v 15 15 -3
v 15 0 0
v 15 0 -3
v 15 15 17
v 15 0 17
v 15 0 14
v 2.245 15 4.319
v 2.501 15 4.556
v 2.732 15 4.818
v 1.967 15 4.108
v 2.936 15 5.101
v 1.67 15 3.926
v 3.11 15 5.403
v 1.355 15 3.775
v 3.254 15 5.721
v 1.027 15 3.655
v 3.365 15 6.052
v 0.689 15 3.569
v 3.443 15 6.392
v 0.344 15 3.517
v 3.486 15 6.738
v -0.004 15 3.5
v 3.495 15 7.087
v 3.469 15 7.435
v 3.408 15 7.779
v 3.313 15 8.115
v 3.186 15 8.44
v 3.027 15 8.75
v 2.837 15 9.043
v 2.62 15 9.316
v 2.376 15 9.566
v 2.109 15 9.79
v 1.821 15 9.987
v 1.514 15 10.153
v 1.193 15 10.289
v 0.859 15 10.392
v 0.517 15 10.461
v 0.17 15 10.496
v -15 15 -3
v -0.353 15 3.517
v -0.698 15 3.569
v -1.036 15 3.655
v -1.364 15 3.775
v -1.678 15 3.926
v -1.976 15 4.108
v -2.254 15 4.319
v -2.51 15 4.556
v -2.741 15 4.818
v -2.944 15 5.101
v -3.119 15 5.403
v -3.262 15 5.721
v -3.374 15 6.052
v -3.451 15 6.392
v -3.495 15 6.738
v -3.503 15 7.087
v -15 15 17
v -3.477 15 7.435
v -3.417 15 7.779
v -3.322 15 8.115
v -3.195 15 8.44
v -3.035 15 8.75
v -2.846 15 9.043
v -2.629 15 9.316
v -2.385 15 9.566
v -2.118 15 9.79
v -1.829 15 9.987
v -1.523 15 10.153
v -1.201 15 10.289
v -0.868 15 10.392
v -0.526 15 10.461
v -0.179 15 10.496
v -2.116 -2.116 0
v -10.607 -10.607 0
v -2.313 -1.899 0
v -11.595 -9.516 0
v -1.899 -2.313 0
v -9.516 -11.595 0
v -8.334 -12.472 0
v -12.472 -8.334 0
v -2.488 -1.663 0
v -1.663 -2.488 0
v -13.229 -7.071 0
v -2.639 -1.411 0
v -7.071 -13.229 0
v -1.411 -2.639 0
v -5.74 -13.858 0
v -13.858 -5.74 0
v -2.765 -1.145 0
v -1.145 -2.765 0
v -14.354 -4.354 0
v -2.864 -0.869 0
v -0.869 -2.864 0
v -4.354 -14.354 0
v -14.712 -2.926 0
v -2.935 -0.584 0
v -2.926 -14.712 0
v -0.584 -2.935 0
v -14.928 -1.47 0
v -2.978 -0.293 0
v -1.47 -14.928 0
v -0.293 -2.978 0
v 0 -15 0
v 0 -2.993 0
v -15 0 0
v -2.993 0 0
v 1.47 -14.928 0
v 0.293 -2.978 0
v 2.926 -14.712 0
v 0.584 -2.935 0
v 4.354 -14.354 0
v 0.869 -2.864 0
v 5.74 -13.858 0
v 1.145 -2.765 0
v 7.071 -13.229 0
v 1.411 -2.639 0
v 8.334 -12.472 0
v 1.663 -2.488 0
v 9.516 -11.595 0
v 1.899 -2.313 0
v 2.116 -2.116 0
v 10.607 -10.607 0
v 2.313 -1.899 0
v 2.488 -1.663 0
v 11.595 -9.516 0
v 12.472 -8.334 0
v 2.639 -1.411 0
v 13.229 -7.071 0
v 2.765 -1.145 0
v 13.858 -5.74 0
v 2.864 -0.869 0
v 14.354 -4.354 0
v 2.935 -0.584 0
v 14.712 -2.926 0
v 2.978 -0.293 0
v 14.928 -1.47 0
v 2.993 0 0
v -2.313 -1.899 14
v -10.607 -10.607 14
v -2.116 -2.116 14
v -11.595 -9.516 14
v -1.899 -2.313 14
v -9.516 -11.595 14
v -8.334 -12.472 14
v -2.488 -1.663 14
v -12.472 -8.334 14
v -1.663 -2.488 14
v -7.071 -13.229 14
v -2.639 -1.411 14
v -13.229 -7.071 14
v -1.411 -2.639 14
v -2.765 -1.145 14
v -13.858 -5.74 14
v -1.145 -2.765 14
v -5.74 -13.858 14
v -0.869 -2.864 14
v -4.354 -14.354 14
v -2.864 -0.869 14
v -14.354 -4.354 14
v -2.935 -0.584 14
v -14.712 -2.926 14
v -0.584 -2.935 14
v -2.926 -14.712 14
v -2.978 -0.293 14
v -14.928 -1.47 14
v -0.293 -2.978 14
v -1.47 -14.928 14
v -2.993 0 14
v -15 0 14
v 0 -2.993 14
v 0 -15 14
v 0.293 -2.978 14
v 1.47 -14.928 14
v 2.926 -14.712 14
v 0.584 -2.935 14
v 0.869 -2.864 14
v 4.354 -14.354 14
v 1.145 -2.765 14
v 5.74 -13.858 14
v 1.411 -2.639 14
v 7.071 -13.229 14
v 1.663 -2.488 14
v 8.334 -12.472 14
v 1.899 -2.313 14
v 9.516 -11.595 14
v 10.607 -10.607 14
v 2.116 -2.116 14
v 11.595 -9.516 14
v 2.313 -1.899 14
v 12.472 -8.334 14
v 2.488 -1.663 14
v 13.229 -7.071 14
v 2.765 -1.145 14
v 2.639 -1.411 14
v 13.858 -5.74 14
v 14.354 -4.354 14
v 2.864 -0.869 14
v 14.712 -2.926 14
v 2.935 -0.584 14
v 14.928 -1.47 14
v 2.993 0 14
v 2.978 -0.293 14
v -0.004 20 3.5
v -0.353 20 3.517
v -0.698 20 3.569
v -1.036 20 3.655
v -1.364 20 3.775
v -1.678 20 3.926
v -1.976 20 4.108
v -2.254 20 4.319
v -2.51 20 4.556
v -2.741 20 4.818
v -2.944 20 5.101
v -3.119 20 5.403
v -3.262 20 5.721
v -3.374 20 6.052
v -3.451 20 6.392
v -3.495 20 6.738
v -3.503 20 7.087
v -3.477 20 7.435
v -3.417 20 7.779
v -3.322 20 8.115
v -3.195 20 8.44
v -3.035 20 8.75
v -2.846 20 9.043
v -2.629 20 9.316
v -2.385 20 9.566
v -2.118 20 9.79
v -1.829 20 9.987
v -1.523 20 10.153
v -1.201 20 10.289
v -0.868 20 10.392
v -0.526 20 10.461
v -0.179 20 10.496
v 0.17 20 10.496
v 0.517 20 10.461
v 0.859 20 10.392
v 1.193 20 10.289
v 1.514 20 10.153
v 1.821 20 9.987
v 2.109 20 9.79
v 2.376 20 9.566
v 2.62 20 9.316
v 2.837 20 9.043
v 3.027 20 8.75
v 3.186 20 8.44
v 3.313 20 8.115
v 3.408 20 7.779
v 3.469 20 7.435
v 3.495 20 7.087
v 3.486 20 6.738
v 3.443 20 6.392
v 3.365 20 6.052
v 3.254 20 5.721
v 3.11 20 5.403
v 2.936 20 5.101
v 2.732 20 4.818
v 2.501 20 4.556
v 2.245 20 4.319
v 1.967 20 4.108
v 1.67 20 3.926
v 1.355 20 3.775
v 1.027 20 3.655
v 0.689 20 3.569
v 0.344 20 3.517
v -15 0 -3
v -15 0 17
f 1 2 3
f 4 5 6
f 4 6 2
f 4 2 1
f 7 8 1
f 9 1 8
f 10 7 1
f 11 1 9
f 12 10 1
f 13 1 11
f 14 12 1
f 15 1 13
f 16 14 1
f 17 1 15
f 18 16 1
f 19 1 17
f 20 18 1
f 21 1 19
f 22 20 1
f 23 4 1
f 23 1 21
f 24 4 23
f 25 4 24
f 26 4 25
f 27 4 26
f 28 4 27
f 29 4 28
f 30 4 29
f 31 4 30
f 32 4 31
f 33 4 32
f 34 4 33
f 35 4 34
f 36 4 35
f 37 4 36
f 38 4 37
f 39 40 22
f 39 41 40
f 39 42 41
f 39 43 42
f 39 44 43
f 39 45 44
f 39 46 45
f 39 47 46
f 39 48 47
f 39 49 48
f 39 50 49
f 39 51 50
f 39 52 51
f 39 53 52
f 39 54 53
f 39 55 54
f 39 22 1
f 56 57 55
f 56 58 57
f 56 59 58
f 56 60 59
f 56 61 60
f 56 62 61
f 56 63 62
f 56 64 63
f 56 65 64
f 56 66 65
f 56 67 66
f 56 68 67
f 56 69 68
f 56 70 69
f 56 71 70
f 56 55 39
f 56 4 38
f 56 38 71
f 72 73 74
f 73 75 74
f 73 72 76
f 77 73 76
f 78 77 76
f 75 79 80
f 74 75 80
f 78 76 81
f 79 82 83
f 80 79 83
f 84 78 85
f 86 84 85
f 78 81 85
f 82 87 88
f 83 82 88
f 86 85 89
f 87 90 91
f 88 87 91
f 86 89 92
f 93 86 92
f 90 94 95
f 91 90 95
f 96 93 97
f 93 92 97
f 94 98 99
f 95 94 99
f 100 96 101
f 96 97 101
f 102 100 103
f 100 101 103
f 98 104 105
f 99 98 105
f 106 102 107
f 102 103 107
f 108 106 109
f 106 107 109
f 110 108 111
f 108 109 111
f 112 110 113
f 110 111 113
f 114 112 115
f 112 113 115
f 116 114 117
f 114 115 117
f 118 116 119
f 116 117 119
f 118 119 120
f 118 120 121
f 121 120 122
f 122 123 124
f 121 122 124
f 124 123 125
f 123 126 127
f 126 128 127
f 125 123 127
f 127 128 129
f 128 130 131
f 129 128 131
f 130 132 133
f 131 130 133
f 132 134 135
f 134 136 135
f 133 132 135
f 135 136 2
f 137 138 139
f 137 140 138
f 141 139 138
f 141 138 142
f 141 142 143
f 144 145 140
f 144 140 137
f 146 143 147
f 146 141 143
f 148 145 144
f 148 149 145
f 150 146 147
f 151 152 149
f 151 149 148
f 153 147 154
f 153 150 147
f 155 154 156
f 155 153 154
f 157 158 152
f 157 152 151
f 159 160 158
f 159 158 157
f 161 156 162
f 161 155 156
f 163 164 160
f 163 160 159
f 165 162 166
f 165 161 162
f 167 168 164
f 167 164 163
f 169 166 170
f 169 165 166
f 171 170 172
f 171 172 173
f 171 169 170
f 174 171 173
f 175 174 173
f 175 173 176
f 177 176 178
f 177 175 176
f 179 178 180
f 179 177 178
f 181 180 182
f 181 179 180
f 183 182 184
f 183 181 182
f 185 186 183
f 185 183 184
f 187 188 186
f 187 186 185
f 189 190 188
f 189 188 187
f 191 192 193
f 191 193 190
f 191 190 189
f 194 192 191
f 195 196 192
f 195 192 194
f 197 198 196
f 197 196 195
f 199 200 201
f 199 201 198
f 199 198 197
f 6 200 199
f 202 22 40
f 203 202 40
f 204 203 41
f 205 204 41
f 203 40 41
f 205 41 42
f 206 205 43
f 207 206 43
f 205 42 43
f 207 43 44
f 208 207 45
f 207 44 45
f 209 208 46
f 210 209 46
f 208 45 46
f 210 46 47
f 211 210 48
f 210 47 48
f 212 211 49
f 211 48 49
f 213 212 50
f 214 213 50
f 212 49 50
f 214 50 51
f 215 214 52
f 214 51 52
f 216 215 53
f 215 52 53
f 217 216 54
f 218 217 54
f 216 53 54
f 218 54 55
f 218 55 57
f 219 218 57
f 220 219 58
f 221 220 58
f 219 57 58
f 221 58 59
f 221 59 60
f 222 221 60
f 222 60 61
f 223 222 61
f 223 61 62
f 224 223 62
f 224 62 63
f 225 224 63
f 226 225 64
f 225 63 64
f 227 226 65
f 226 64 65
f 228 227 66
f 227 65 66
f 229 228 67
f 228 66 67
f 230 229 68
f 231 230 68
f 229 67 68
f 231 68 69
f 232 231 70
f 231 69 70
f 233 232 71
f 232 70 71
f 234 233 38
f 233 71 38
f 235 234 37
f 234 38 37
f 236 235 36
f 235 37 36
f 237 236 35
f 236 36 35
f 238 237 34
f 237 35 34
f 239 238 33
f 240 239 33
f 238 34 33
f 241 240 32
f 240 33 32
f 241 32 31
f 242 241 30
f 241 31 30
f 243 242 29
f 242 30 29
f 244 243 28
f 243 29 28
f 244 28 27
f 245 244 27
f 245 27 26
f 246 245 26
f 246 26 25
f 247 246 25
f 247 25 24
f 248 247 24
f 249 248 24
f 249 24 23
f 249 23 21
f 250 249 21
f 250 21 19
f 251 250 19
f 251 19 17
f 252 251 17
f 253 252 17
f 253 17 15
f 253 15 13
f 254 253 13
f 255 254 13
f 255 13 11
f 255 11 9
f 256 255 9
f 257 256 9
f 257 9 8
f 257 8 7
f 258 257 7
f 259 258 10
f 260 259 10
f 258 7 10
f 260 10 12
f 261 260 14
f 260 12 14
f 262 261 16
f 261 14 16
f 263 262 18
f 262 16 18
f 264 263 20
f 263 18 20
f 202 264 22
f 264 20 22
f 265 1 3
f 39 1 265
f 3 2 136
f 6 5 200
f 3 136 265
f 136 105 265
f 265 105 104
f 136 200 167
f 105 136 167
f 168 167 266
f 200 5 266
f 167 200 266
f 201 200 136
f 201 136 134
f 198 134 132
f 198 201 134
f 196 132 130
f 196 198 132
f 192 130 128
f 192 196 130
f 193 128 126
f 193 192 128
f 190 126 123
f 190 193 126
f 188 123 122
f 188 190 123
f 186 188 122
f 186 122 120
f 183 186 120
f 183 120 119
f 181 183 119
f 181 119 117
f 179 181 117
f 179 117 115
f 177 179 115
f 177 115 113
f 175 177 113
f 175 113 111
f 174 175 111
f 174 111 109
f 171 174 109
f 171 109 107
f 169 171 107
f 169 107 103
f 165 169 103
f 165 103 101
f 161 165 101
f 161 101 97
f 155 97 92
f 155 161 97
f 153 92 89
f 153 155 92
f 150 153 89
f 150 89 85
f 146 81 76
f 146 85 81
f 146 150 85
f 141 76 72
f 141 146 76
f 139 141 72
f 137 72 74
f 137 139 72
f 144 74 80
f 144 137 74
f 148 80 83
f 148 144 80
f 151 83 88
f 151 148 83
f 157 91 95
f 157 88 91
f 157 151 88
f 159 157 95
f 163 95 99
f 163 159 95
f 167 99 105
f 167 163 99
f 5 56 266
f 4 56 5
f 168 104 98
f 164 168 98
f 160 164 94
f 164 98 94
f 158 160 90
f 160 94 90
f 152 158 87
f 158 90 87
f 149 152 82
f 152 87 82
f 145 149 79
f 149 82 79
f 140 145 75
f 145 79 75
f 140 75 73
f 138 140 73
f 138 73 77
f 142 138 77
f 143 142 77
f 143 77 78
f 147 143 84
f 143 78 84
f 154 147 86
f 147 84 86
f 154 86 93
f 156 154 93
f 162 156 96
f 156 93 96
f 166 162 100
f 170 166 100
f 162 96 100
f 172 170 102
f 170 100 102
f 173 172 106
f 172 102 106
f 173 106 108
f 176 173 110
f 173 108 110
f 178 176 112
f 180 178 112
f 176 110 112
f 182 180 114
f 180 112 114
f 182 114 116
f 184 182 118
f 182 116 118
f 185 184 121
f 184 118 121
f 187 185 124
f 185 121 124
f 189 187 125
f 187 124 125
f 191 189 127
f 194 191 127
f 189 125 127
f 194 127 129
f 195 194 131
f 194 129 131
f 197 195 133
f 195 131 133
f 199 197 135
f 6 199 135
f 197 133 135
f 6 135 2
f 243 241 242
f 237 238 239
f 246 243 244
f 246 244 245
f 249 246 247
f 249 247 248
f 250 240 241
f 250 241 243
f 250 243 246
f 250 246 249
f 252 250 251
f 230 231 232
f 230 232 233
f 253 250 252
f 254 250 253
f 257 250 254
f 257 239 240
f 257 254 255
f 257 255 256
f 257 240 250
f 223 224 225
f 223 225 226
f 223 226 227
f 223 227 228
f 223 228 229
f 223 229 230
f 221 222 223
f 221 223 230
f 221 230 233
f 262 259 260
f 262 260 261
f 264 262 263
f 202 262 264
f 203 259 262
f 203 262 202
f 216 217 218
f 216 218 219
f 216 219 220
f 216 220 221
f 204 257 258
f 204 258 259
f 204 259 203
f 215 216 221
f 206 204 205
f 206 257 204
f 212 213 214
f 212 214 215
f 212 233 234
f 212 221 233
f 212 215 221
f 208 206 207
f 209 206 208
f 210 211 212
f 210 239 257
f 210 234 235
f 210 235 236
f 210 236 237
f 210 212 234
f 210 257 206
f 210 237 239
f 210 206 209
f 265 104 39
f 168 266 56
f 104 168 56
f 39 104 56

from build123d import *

# Parameters (mm, degrees)
EXTRUSION1_DEPTH        = 14
ESQUISSE2_W             = 30
ESQUISSE2_H             = 15
EXTRUSION2_DEPTH        = 3
ESQUISSE3_W             = 30
ESQUISSE3_H             = 15
EXTRUSION3_DEPTH        = 3
ESQUISSE4_R             = 3.5
EXTRUSION4_DEPTH        = 5
ENL_V_MAT_EXTRU_1_DEPTH = 18


with BuildPart() as part:
    # Esquisse1 → Extrusion1 (new body)
    with BuildSketch(Plane.XY):
        with BuildLine():
            Line((15, 15), (-15, 15))
            Line((-15, 15), (-15, 0))
            ThreePointArc((-15, 0), (0, -15), (15, 0))
            Line((15, 0), (15, 15))
        make_face()
    extrude(amount=EXTRUSION1_DEPTH)

    # Esquisse2 → Extrusion2 (add)
    with BuildSketch(Plane.XY.offset(14)):
        with Locations((0, 7.5)):
            Rectangle(ESQUISSE2_W, ESQUISSE2_H)
    extrude(amount=EXTRUSION2_DEPTH)

    # Esquisse3 → Extrusion3 (add)
    with BuildSketch(Plane(origin=(0, 0, 0), x_dir=(-1, 0, 0), z_dir=(0, 0, -1))):
        with Locations((0, 7.5)):
            Rectangle(ESQUISSE3_W, ESQUISSE3_H)
    extrude(amount=EXTRUSION3_DEPTH)

    # Esquisse4 → Extrusion4 (add)
    with BuildSketch(Plane(origin=(0, 15, 0), x_dir=(1, 0, 0), z_dir=(0, 1, 0))):
        with Locations(Location((-0.004325278, -7, 0), (0, 0, 90))):
            Circle(ESQUISSE4_R)
    extrude(amount=EXTRUSION4_DEPTH)

    # Esquisse5 → Enlèv. mat.-Extru.1 (cut)
    with BuildSketch(Plane.XY.offset(14)):
        with BuildLine():
            Line((-2.992817477, 0), (2.992817477, 0))
            ThreePointArc((2.992817477, 0), (0, -2.992817477), (-2.992817477, 0))
        make_face()
    extrude(amount=-ENL_V_MAT_EXTRU_1_DEPTH, mode=Mode.SUBTRACT)


solid = part.part
